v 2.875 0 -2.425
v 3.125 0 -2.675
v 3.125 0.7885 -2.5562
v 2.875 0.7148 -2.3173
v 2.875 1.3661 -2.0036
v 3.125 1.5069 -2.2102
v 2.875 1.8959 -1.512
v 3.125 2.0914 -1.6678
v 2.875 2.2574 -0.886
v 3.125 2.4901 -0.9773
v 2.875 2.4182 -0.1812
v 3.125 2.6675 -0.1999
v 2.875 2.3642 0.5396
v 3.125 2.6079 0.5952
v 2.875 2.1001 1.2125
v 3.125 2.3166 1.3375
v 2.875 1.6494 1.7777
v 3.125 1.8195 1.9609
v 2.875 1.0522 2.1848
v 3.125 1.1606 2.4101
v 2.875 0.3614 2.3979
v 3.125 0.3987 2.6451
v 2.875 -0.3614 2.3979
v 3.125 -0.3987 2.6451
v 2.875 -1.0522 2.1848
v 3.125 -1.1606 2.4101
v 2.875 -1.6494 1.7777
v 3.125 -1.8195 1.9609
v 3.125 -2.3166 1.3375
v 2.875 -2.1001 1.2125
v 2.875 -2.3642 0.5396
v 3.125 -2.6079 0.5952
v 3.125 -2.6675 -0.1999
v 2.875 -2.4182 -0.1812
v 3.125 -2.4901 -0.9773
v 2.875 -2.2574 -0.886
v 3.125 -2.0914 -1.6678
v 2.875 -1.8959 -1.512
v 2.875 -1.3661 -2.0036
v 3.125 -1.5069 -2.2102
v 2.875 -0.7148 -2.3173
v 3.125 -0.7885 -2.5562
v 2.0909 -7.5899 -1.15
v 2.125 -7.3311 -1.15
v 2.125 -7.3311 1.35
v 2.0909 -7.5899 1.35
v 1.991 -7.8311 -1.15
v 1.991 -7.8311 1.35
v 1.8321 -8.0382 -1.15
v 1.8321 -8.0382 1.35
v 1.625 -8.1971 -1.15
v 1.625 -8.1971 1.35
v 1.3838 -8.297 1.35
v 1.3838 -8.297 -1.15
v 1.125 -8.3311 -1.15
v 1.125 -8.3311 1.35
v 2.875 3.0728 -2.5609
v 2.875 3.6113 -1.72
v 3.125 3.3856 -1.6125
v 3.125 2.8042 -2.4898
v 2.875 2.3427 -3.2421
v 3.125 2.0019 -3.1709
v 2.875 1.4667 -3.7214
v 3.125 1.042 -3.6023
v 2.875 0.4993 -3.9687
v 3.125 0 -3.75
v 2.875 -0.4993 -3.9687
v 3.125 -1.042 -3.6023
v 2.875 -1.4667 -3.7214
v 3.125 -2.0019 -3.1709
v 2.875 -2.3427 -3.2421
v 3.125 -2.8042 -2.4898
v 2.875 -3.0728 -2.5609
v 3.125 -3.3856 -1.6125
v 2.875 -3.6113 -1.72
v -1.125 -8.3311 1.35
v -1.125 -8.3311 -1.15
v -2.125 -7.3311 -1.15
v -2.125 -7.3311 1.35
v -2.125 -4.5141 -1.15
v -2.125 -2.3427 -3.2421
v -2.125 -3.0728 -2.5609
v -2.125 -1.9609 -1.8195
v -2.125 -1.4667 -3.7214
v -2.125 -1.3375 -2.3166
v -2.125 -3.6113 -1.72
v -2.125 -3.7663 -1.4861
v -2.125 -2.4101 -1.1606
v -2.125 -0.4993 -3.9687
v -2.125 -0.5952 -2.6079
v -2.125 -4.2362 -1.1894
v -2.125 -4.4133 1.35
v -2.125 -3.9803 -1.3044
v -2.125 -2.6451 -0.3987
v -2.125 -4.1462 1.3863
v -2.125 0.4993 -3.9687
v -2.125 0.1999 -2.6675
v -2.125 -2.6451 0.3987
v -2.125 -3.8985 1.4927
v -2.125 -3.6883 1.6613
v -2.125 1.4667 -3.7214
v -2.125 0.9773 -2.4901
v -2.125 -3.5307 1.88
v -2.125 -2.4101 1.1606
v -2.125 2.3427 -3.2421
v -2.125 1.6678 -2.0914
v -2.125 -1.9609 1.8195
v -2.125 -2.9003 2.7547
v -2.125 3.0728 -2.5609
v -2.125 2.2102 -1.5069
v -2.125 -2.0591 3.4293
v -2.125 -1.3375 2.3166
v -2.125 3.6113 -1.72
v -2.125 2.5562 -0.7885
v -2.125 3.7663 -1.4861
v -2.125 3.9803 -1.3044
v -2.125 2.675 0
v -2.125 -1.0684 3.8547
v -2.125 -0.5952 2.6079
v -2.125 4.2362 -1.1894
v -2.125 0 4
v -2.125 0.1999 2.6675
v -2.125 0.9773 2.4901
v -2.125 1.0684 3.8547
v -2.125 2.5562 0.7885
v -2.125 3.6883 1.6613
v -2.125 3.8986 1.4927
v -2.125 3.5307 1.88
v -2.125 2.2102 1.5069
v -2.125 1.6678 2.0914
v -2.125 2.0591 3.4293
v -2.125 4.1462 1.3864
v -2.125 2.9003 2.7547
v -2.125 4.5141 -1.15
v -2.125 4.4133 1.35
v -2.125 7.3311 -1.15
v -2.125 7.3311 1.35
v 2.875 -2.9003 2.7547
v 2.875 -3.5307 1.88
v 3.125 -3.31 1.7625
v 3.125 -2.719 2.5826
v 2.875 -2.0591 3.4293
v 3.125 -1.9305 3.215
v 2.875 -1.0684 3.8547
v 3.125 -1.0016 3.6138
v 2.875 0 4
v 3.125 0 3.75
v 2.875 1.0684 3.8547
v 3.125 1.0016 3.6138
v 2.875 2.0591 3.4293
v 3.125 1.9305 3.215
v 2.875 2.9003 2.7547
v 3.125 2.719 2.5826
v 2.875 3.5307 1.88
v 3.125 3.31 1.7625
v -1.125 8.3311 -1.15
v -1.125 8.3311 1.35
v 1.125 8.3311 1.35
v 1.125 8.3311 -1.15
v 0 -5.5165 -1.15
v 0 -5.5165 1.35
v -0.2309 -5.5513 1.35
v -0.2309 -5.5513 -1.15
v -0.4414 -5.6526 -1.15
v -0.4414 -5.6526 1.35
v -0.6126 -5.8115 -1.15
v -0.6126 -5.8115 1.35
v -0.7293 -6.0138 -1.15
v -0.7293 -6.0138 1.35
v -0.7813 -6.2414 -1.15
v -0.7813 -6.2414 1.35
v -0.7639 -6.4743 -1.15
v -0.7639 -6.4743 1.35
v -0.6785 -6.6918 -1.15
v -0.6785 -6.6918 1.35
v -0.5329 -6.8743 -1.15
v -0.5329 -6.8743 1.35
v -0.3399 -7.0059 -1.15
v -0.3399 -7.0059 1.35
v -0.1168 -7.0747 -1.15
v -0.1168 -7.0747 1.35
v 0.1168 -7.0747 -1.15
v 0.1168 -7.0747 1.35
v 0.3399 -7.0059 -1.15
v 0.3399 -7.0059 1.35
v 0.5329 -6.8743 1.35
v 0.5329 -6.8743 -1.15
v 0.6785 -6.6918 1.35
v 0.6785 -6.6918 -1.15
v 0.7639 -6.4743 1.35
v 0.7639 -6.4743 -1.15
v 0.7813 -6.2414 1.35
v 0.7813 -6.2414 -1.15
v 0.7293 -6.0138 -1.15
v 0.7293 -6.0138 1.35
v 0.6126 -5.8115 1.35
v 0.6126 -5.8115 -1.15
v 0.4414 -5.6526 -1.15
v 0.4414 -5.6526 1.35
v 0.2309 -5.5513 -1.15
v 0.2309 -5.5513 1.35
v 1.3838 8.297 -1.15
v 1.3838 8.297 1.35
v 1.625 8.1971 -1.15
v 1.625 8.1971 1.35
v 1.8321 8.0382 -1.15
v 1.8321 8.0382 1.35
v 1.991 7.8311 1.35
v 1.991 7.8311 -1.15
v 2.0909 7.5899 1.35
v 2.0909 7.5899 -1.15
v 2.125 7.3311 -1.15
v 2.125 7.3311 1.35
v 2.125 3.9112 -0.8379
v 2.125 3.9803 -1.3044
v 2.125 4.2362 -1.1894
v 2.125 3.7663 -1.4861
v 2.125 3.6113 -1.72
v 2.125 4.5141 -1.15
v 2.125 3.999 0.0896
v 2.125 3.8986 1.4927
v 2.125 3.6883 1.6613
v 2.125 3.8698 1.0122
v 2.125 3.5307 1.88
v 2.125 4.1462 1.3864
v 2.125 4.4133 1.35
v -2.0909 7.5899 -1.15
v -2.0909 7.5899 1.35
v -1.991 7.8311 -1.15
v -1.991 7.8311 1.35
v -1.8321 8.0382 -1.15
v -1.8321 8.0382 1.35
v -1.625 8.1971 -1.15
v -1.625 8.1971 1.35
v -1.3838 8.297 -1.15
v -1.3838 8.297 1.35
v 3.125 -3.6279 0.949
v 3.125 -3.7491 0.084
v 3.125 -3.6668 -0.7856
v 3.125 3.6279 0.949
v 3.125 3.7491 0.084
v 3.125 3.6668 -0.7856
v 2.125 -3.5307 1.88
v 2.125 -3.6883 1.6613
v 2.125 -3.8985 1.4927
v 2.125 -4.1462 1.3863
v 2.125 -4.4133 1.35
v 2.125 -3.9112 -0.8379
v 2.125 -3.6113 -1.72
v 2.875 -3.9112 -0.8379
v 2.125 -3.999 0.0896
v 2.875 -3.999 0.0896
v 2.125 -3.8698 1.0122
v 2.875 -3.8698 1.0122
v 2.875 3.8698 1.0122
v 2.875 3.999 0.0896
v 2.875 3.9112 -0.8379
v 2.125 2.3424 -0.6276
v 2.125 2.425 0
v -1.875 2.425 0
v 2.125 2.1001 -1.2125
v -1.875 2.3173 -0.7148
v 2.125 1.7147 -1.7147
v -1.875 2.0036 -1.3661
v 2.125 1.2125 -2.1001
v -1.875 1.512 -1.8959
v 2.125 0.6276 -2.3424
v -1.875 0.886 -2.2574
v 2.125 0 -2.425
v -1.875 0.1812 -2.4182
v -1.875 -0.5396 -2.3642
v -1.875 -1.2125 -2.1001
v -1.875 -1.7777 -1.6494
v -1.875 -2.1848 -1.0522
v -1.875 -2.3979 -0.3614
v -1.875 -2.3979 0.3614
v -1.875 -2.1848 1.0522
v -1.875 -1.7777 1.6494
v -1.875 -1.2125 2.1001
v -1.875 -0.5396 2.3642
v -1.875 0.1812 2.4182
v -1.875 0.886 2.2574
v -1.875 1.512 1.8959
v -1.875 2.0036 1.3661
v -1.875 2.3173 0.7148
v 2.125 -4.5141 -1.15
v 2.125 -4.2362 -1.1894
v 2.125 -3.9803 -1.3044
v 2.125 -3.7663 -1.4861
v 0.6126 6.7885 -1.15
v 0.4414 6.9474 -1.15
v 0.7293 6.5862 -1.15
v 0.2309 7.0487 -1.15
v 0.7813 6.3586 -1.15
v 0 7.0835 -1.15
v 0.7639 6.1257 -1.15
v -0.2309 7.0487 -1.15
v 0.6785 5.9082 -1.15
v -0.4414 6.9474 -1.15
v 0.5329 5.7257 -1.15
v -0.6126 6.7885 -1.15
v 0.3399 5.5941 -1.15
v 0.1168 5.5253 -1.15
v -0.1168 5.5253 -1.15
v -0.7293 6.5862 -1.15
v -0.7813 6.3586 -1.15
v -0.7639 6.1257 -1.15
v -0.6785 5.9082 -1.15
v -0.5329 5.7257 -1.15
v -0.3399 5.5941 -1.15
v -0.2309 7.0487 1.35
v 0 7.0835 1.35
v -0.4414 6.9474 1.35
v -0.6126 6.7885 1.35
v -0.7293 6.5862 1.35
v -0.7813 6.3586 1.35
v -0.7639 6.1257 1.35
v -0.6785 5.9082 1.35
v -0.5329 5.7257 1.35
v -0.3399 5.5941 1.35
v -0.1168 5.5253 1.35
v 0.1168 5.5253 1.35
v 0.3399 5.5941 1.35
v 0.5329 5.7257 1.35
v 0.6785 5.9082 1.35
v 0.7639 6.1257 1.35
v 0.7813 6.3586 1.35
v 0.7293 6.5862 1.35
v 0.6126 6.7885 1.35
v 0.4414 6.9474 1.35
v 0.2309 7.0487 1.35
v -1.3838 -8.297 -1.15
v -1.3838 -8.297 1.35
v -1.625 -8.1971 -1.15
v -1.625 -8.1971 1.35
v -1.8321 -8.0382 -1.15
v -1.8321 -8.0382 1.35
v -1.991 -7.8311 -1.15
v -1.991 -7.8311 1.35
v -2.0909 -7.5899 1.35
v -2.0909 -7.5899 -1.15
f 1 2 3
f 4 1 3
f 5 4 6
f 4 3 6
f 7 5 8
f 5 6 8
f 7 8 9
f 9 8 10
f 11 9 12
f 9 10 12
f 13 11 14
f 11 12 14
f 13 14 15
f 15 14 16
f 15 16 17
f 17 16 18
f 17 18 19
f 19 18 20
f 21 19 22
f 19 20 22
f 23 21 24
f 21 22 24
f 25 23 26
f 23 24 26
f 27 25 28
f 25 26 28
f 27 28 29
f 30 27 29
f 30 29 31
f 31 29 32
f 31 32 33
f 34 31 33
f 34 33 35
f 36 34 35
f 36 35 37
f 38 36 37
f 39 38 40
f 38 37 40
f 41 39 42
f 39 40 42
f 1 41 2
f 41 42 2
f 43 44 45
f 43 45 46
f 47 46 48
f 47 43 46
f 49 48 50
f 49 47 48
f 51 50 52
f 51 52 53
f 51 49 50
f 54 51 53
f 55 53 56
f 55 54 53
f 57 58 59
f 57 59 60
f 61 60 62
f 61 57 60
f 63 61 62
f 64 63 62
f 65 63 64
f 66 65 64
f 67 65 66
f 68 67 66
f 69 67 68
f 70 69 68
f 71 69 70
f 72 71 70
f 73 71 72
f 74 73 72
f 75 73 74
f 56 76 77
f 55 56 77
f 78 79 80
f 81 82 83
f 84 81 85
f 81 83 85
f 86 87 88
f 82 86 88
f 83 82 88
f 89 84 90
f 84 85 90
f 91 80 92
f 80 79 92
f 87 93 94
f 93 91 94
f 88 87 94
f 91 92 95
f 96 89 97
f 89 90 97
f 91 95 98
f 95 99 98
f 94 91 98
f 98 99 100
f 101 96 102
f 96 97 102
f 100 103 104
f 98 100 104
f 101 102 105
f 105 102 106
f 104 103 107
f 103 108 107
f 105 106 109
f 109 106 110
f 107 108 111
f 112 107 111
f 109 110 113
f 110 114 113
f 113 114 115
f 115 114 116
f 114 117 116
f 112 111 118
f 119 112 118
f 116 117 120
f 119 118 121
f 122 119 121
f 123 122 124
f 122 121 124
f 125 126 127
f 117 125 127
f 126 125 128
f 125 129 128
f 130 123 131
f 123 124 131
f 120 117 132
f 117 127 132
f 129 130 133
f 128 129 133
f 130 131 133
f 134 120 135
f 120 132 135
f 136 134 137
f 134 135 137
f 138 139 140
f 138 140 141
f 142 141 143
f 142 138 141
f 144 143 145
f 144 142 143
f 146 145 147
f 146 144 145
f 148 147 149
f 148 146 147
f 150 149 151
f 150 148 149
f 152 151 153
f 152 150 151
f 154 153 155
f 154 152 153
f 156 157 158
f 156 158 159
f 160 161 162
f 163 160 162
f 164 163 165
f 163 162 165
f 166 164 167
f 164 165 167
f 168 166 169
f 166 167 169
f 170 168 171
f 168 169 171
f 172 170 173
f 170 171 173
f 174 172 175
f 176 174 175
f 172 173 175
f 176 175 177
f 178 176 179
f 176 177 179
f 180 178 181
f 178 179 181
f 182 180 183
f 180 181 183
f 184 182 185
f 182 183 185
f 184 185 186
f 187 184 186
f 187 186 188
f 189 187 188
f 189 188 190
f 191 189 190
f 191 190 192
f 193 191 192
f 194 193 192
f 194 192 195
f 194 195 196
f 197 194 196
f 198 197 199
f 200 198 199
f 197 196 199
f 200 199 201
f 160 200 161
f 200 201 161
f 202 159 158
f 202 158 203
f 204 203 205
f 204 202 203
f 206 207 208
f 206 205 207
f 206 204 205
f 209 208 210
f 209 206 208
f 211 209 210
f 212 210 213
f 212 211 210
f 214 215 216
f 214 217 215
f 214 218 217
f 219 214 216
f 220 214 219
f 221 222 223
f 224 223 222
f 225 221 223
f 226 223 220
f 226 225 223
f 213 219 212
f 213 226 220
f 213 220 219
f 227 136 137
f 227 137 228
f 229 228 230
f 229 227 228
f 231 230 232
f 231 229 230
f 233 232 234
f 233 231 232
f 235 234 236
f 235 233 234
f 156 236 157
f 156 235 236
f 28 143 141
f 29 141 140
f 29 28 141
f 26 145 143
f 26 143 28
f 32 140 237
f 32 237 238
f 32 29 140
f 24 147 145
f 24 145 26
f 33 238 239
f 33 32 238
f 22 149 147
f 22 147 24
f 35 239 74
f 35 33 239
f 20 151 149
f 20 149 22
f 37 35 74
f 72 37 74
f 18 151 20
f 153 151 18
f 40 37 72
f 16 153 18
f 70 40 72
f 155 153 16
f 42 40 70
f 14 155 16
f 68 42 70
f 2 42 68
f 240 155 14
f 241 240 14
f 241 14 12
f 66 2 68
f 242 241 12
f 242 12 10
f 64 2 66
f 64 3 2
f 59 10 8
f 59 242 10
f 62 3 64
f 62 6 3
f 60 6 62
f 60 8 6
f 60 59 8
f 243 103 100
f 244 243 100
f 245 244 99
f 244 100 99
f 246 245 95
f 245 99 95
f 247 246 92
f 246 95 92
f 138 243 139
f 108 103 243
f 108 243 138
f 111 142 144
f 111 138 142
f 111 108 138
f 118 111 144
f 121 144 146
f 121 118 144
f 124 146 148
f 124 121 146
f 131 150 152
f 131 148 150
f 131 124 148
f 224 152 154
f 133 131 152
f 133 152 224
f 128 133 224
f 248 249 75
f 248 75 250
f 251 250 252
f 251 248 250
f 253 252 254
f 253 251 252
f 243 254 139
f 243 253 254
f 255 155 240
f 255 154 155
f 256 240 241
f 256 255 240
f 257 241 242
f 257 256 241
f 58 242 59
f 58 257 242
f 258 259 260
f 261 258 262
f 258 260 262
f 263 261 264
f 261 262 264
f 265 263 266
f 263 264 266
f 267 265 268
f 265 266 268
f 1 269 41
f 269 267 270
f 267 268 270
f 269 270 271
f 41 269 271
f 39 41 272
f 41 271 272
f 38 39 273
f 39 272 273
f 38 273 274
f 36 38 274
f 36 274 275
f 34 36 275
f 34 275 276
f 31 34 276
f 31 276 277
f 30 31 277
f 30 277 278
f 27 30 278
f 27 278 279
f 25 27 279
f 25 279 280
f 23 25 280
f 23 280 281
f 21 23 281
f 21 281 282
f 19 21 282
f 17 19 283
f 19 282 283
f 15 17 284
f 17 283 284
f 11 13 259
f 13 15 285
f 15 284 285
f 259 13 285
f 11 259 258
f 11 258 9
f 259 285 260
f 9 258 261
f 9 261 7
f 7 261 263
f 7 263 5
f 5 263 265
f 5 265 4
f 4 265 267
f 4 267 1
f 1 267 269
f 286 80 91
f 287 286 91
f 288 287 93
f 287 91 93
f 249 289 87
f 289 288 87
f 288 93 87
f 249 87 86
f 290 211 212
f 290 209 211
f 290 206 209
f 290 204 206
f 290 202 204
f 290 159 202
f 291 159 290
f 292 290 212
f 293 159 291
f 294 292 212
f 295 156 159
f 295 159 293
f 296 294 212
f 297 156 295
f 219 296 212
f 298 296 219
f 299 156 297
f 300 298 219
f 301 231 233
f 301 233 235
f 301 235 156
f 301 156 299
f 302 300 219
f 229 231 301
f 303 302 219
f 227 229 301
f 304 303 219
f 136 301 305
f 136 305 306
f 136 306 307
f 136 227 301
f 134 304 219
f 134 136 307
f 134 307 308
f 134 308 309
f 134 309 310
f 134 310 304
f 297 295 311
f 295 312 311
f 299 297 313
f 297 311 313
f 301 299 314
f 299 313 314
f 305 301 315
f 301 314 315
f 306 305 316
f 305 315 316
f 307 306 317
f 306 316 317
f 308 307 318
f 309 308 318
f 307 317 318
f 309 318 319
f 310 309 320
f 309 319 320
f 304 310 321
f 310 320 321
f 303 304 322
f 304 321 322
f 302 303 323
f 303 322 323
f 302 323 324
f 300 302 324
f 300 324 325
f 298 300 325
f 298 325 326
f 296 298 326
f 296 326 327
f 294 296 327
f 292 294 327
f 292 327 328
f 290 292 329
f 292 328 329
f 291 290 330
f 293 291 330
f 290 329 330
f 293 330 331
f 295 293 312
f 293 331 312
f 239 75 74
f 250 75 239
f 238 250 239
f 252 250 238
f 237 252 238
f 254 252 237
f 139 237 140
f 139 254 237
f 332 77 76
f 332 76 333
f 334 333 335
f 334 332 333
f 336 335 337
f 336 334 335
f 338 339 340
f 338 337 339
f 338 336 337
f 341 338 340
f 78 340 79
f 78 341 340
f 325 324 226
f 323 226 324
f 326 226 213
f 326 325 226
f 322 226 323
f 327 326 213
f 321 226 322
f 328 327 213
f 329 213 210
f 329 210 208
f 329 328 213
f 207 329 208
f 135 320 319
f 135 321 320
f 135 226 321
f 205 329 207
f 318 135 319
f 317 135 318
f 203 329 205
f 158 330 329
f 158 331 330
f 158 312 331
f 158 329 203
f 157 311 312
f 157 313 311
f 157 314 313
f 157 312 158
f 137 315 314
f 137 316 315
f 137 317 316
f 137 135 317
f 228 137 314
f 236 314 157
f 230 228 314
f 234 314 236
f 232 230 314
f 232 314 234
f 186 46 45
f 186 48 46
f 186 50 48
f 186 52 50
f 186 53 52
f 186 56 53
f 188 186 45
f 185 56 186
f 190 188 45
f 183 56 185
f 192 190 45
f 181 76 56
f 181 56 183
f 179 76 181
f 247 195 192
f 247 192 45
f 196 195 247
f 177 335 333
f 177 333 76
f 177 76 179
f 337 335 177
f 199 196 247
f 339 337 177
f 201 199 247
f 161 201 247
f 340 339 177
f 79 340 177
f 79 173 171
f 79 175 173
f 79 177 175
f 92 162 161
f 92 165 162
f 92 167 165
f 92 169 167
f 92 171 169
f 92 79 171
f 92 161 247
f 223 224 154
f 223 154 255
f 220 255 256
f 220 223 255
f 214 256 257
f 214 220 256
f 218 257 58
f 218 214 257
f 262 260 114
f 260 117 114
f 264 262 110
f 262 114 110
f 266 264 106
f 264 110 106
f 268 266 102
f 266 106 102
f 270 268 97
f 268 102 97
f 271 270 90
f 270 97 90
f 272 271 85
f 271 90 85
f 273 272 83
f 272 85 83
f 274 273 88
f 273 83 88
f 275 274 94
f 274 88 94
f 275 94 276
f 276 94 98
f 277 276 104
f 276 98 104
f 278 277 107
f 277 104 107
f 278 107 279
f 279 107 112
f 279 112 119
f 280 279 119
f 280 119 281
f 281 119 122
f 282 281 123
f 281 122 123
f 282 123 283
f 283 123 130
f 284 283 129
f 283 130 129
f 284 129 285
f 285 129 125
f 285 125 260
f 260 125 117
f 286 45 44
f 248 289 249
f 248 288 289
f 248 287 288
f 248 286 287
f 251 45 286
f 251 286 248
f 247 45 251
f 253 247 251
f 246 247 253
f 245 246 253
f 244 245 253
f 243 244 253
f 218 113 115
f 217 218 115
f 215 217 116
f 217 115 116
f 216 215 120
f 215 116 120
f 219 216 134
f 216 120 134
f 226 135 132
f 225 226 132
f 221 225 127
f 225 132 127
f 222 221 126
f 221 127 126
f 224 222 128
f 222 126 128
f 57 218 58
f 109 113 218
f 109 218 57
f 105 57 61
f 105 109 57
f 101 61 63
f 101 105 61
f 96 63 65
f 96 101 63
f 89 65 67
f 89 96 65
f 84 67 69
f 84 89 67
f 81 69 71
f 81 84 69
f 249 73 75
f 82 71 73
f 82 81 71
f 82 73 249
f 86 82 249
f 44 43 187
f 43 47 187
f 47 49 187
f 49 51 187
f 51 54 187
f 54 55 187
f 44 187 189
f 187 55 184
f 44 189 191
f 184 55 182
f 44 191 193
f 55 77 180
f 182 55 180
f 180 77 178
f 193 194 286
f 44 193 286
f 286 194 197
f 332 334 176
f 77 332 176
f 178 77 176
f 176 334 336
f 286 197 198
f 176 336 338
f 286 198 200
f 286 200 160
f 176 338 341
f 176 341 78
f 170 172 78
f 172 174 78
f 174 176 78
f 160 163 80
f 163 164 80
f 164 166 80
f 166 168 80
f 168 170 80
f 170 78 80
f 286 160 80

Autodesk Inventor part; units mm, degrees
ref_plane "YZ Plane" through (0, 0, 0) normal (1, 0, 0) x (0, 1, 0)
ref_plane "XZ Plane" through (0, 0, 0) normal (0, 1, 0) x (-1, 0, 0)
ref_plane "XY Plane" through (0, 0, 0) normal (0, 0, 1) x (1, 0, 0)
sketch "Sketch1" plane through (0, 0, 0) normal (1, 0, 0) x (0, 1, 0)
  circle A0 centre (0, 0) radius 2.3812 construction
  circle A1 centre (0, 0) radius 2.425
  line L0 (-8.3311, 1.35) -> (-8.3311, -1.15)
  line L1 (-8.3311, -1.15) -> (-4.5141, -1.15)
  line L2 (-8.3311, 1.35) -> (-4.4133, 1.35)
  arc A2 (3.5307, 1.88) -> (-3.5307, 1.88) centre (0, 0) ccw
  arc A3 (-3.6113, -1.72) -> (3.6113, -1.72) centre (0, 0) ccw
  line L3 (4.4133, 1.35) -> (8.3311, 1.35)
  line L4 (8.3311, 1.35) -> (8.3311, -1.15)
  line L5 (8.3311, -1.15) -> (4.5141, -1.15)
  arc A4 (-4.4133, 1.35) -> (-3.5307, 1.88) centre (-4.4133, 2.35) ccw
  arc A5 (-3.6113, -1.72) -> (-4.5141, -1.15) centre (-4.5141, -2.15) ccw
  arc A6 (4.5141, -1.15) -> (3.6113, -1.72) centre (4.5141, -2.15) ccw
  arc A7 (3.5307, 1.88) -> (4.4133, 1.35) centre (4.4133, 2.35) ccw
  point P0 (-3.8311, -1.15)
  point P1 (-3.7653, 1.35)
  point P2 (3.7653, 1.35)
  point P3 (3.8311, -1.15)
  dimension "d0" = 4.7625
  dimension "d1" = 4.85
  dimension "d2" = 0.0437
  dimension "d3" = 4
  dimension "d4" = 1.575
  dimension "d6" = 2.5
  dimension "d7" = 4.5
  dimension "d8" = 16.6623
  dimension "d9" = 1
  dimension "d25" = 1.35
extrude "Extrusion1" add sketch "Sketch1" along normal mid plane 4.25
sketch "Sketch2" plane through (2.125, 0, 0) normal (1, 0, 0) x (0, 0, -1)
  circle A0 centre (0, 0) radius 2.425 projected
  line L0 (-1.35, -8.3311) -> (1.15, -8.3311) projected
  line L1 (1.15, -8.3311) -> (1.15, -4.5141) projected
  arc A1 (1.72, -3.6113) -> (1.15, -4.5141) centre (2.15, -4.5141) ccw projected
  arc A2 (1.72, -3.6113) -> (1.72, 3.6113) centre (0, 0) ccw projected
  arc A3 (1.15, 4.5141) -> (1.72, 3.6113) centre (2.15, 4.5141) ccw projected
  line L2 (1.15, 4.5141) -> (1.15, 8.3311) projected
  line L3 (1.15, 8.3311) -> (-1.35, 8.3311) projected
  line L4 (-1.35, 8.3311) -> (-1.35, 4.4133) projected
  arc A4 (-1.88, 3.5307) -> (-1.35, 4.4133) centre (-2.35, 4.4133) ccw projected
  arc A5 (-1.88, 3.5307) -> (-1.88, -3.5307) centre (0, 0) ccw projected
  arc A6 (-1.35, -4.4133) -> (-1.88, -3.5307) centre (-2.35, -4.4133) ccw projected
  line L5 (-1.35, -4.4133) -> (-1.35, -8.3311) projected
  arc A7 (-1.88, 3.5307) -> (-1.88, -3.5307) centre (0, 0) ccw projected
  circle A8 centre (0, 0) radius 4
extrude "Extrusion2" add sketch "Sketch2" along normal blind 1 contours A5 A8 A2
chamfer "Chamfer1" distance 0.25 angle 45 3 edges at (3.125, 0, 4) (3.125, 0, 2.425) (-2.125, -2.425, 0)
sketch "Sketch3" plane through (2.125, -4.5141, -1.15) normal (0, 0, -1) x (-1, 0, 0)
  line L0 (4.25, 0) -> (0, 0) projected
  line L1 (0, -3.817) -> (0, 0) projected
  line L2 (4.25, -3.817) -> (0, -3.817) projected
  line L3 (4.25, 0) -> (4.25, -3.817) projected
  line L4 (4.25, 12.8453) -> (0, 12.8453) projected
  line L5 (0, 9.0283) -> (0, 12.8453) projected
  line L6 (4.25, 9.0283) -> (0, 9.0283) projected
  line L7 (4.25, 12.8453) -> (4.25, 9.0283) projected
  line L8 (2.125, -1.7859) -> (2.125, 10.8141) construction
  line L9 (4.25, 0.9028) -> (4.25, 8.1255) projected
  point P0 (2.125, 4.5141)
  point P1 (4.25, 4.5141)
  point P2 (2.125, -3.817)
  point P3 (2.125, 4.5141)
  dimension "d17" = 12.6
hole "Hole1" at (0, -6.3, -1.15) at (0, 6.3, -1.15) direction (0, 0, 1) diameter 1.567 end through all thread size "M2x0.4" class "6H" standard "ANSI Metric M Profile"
fillet "Fillet1" radius 1 4 edges at (-2.125, -8.3311, 0.1) (2.125, -8.3311, 0.1) (2.125, 8.3311, 0.1) (-2.125, 8.3311, 0.1)
properties part number "EPS_RBFPinHolder" material "Aluminum 6061"
